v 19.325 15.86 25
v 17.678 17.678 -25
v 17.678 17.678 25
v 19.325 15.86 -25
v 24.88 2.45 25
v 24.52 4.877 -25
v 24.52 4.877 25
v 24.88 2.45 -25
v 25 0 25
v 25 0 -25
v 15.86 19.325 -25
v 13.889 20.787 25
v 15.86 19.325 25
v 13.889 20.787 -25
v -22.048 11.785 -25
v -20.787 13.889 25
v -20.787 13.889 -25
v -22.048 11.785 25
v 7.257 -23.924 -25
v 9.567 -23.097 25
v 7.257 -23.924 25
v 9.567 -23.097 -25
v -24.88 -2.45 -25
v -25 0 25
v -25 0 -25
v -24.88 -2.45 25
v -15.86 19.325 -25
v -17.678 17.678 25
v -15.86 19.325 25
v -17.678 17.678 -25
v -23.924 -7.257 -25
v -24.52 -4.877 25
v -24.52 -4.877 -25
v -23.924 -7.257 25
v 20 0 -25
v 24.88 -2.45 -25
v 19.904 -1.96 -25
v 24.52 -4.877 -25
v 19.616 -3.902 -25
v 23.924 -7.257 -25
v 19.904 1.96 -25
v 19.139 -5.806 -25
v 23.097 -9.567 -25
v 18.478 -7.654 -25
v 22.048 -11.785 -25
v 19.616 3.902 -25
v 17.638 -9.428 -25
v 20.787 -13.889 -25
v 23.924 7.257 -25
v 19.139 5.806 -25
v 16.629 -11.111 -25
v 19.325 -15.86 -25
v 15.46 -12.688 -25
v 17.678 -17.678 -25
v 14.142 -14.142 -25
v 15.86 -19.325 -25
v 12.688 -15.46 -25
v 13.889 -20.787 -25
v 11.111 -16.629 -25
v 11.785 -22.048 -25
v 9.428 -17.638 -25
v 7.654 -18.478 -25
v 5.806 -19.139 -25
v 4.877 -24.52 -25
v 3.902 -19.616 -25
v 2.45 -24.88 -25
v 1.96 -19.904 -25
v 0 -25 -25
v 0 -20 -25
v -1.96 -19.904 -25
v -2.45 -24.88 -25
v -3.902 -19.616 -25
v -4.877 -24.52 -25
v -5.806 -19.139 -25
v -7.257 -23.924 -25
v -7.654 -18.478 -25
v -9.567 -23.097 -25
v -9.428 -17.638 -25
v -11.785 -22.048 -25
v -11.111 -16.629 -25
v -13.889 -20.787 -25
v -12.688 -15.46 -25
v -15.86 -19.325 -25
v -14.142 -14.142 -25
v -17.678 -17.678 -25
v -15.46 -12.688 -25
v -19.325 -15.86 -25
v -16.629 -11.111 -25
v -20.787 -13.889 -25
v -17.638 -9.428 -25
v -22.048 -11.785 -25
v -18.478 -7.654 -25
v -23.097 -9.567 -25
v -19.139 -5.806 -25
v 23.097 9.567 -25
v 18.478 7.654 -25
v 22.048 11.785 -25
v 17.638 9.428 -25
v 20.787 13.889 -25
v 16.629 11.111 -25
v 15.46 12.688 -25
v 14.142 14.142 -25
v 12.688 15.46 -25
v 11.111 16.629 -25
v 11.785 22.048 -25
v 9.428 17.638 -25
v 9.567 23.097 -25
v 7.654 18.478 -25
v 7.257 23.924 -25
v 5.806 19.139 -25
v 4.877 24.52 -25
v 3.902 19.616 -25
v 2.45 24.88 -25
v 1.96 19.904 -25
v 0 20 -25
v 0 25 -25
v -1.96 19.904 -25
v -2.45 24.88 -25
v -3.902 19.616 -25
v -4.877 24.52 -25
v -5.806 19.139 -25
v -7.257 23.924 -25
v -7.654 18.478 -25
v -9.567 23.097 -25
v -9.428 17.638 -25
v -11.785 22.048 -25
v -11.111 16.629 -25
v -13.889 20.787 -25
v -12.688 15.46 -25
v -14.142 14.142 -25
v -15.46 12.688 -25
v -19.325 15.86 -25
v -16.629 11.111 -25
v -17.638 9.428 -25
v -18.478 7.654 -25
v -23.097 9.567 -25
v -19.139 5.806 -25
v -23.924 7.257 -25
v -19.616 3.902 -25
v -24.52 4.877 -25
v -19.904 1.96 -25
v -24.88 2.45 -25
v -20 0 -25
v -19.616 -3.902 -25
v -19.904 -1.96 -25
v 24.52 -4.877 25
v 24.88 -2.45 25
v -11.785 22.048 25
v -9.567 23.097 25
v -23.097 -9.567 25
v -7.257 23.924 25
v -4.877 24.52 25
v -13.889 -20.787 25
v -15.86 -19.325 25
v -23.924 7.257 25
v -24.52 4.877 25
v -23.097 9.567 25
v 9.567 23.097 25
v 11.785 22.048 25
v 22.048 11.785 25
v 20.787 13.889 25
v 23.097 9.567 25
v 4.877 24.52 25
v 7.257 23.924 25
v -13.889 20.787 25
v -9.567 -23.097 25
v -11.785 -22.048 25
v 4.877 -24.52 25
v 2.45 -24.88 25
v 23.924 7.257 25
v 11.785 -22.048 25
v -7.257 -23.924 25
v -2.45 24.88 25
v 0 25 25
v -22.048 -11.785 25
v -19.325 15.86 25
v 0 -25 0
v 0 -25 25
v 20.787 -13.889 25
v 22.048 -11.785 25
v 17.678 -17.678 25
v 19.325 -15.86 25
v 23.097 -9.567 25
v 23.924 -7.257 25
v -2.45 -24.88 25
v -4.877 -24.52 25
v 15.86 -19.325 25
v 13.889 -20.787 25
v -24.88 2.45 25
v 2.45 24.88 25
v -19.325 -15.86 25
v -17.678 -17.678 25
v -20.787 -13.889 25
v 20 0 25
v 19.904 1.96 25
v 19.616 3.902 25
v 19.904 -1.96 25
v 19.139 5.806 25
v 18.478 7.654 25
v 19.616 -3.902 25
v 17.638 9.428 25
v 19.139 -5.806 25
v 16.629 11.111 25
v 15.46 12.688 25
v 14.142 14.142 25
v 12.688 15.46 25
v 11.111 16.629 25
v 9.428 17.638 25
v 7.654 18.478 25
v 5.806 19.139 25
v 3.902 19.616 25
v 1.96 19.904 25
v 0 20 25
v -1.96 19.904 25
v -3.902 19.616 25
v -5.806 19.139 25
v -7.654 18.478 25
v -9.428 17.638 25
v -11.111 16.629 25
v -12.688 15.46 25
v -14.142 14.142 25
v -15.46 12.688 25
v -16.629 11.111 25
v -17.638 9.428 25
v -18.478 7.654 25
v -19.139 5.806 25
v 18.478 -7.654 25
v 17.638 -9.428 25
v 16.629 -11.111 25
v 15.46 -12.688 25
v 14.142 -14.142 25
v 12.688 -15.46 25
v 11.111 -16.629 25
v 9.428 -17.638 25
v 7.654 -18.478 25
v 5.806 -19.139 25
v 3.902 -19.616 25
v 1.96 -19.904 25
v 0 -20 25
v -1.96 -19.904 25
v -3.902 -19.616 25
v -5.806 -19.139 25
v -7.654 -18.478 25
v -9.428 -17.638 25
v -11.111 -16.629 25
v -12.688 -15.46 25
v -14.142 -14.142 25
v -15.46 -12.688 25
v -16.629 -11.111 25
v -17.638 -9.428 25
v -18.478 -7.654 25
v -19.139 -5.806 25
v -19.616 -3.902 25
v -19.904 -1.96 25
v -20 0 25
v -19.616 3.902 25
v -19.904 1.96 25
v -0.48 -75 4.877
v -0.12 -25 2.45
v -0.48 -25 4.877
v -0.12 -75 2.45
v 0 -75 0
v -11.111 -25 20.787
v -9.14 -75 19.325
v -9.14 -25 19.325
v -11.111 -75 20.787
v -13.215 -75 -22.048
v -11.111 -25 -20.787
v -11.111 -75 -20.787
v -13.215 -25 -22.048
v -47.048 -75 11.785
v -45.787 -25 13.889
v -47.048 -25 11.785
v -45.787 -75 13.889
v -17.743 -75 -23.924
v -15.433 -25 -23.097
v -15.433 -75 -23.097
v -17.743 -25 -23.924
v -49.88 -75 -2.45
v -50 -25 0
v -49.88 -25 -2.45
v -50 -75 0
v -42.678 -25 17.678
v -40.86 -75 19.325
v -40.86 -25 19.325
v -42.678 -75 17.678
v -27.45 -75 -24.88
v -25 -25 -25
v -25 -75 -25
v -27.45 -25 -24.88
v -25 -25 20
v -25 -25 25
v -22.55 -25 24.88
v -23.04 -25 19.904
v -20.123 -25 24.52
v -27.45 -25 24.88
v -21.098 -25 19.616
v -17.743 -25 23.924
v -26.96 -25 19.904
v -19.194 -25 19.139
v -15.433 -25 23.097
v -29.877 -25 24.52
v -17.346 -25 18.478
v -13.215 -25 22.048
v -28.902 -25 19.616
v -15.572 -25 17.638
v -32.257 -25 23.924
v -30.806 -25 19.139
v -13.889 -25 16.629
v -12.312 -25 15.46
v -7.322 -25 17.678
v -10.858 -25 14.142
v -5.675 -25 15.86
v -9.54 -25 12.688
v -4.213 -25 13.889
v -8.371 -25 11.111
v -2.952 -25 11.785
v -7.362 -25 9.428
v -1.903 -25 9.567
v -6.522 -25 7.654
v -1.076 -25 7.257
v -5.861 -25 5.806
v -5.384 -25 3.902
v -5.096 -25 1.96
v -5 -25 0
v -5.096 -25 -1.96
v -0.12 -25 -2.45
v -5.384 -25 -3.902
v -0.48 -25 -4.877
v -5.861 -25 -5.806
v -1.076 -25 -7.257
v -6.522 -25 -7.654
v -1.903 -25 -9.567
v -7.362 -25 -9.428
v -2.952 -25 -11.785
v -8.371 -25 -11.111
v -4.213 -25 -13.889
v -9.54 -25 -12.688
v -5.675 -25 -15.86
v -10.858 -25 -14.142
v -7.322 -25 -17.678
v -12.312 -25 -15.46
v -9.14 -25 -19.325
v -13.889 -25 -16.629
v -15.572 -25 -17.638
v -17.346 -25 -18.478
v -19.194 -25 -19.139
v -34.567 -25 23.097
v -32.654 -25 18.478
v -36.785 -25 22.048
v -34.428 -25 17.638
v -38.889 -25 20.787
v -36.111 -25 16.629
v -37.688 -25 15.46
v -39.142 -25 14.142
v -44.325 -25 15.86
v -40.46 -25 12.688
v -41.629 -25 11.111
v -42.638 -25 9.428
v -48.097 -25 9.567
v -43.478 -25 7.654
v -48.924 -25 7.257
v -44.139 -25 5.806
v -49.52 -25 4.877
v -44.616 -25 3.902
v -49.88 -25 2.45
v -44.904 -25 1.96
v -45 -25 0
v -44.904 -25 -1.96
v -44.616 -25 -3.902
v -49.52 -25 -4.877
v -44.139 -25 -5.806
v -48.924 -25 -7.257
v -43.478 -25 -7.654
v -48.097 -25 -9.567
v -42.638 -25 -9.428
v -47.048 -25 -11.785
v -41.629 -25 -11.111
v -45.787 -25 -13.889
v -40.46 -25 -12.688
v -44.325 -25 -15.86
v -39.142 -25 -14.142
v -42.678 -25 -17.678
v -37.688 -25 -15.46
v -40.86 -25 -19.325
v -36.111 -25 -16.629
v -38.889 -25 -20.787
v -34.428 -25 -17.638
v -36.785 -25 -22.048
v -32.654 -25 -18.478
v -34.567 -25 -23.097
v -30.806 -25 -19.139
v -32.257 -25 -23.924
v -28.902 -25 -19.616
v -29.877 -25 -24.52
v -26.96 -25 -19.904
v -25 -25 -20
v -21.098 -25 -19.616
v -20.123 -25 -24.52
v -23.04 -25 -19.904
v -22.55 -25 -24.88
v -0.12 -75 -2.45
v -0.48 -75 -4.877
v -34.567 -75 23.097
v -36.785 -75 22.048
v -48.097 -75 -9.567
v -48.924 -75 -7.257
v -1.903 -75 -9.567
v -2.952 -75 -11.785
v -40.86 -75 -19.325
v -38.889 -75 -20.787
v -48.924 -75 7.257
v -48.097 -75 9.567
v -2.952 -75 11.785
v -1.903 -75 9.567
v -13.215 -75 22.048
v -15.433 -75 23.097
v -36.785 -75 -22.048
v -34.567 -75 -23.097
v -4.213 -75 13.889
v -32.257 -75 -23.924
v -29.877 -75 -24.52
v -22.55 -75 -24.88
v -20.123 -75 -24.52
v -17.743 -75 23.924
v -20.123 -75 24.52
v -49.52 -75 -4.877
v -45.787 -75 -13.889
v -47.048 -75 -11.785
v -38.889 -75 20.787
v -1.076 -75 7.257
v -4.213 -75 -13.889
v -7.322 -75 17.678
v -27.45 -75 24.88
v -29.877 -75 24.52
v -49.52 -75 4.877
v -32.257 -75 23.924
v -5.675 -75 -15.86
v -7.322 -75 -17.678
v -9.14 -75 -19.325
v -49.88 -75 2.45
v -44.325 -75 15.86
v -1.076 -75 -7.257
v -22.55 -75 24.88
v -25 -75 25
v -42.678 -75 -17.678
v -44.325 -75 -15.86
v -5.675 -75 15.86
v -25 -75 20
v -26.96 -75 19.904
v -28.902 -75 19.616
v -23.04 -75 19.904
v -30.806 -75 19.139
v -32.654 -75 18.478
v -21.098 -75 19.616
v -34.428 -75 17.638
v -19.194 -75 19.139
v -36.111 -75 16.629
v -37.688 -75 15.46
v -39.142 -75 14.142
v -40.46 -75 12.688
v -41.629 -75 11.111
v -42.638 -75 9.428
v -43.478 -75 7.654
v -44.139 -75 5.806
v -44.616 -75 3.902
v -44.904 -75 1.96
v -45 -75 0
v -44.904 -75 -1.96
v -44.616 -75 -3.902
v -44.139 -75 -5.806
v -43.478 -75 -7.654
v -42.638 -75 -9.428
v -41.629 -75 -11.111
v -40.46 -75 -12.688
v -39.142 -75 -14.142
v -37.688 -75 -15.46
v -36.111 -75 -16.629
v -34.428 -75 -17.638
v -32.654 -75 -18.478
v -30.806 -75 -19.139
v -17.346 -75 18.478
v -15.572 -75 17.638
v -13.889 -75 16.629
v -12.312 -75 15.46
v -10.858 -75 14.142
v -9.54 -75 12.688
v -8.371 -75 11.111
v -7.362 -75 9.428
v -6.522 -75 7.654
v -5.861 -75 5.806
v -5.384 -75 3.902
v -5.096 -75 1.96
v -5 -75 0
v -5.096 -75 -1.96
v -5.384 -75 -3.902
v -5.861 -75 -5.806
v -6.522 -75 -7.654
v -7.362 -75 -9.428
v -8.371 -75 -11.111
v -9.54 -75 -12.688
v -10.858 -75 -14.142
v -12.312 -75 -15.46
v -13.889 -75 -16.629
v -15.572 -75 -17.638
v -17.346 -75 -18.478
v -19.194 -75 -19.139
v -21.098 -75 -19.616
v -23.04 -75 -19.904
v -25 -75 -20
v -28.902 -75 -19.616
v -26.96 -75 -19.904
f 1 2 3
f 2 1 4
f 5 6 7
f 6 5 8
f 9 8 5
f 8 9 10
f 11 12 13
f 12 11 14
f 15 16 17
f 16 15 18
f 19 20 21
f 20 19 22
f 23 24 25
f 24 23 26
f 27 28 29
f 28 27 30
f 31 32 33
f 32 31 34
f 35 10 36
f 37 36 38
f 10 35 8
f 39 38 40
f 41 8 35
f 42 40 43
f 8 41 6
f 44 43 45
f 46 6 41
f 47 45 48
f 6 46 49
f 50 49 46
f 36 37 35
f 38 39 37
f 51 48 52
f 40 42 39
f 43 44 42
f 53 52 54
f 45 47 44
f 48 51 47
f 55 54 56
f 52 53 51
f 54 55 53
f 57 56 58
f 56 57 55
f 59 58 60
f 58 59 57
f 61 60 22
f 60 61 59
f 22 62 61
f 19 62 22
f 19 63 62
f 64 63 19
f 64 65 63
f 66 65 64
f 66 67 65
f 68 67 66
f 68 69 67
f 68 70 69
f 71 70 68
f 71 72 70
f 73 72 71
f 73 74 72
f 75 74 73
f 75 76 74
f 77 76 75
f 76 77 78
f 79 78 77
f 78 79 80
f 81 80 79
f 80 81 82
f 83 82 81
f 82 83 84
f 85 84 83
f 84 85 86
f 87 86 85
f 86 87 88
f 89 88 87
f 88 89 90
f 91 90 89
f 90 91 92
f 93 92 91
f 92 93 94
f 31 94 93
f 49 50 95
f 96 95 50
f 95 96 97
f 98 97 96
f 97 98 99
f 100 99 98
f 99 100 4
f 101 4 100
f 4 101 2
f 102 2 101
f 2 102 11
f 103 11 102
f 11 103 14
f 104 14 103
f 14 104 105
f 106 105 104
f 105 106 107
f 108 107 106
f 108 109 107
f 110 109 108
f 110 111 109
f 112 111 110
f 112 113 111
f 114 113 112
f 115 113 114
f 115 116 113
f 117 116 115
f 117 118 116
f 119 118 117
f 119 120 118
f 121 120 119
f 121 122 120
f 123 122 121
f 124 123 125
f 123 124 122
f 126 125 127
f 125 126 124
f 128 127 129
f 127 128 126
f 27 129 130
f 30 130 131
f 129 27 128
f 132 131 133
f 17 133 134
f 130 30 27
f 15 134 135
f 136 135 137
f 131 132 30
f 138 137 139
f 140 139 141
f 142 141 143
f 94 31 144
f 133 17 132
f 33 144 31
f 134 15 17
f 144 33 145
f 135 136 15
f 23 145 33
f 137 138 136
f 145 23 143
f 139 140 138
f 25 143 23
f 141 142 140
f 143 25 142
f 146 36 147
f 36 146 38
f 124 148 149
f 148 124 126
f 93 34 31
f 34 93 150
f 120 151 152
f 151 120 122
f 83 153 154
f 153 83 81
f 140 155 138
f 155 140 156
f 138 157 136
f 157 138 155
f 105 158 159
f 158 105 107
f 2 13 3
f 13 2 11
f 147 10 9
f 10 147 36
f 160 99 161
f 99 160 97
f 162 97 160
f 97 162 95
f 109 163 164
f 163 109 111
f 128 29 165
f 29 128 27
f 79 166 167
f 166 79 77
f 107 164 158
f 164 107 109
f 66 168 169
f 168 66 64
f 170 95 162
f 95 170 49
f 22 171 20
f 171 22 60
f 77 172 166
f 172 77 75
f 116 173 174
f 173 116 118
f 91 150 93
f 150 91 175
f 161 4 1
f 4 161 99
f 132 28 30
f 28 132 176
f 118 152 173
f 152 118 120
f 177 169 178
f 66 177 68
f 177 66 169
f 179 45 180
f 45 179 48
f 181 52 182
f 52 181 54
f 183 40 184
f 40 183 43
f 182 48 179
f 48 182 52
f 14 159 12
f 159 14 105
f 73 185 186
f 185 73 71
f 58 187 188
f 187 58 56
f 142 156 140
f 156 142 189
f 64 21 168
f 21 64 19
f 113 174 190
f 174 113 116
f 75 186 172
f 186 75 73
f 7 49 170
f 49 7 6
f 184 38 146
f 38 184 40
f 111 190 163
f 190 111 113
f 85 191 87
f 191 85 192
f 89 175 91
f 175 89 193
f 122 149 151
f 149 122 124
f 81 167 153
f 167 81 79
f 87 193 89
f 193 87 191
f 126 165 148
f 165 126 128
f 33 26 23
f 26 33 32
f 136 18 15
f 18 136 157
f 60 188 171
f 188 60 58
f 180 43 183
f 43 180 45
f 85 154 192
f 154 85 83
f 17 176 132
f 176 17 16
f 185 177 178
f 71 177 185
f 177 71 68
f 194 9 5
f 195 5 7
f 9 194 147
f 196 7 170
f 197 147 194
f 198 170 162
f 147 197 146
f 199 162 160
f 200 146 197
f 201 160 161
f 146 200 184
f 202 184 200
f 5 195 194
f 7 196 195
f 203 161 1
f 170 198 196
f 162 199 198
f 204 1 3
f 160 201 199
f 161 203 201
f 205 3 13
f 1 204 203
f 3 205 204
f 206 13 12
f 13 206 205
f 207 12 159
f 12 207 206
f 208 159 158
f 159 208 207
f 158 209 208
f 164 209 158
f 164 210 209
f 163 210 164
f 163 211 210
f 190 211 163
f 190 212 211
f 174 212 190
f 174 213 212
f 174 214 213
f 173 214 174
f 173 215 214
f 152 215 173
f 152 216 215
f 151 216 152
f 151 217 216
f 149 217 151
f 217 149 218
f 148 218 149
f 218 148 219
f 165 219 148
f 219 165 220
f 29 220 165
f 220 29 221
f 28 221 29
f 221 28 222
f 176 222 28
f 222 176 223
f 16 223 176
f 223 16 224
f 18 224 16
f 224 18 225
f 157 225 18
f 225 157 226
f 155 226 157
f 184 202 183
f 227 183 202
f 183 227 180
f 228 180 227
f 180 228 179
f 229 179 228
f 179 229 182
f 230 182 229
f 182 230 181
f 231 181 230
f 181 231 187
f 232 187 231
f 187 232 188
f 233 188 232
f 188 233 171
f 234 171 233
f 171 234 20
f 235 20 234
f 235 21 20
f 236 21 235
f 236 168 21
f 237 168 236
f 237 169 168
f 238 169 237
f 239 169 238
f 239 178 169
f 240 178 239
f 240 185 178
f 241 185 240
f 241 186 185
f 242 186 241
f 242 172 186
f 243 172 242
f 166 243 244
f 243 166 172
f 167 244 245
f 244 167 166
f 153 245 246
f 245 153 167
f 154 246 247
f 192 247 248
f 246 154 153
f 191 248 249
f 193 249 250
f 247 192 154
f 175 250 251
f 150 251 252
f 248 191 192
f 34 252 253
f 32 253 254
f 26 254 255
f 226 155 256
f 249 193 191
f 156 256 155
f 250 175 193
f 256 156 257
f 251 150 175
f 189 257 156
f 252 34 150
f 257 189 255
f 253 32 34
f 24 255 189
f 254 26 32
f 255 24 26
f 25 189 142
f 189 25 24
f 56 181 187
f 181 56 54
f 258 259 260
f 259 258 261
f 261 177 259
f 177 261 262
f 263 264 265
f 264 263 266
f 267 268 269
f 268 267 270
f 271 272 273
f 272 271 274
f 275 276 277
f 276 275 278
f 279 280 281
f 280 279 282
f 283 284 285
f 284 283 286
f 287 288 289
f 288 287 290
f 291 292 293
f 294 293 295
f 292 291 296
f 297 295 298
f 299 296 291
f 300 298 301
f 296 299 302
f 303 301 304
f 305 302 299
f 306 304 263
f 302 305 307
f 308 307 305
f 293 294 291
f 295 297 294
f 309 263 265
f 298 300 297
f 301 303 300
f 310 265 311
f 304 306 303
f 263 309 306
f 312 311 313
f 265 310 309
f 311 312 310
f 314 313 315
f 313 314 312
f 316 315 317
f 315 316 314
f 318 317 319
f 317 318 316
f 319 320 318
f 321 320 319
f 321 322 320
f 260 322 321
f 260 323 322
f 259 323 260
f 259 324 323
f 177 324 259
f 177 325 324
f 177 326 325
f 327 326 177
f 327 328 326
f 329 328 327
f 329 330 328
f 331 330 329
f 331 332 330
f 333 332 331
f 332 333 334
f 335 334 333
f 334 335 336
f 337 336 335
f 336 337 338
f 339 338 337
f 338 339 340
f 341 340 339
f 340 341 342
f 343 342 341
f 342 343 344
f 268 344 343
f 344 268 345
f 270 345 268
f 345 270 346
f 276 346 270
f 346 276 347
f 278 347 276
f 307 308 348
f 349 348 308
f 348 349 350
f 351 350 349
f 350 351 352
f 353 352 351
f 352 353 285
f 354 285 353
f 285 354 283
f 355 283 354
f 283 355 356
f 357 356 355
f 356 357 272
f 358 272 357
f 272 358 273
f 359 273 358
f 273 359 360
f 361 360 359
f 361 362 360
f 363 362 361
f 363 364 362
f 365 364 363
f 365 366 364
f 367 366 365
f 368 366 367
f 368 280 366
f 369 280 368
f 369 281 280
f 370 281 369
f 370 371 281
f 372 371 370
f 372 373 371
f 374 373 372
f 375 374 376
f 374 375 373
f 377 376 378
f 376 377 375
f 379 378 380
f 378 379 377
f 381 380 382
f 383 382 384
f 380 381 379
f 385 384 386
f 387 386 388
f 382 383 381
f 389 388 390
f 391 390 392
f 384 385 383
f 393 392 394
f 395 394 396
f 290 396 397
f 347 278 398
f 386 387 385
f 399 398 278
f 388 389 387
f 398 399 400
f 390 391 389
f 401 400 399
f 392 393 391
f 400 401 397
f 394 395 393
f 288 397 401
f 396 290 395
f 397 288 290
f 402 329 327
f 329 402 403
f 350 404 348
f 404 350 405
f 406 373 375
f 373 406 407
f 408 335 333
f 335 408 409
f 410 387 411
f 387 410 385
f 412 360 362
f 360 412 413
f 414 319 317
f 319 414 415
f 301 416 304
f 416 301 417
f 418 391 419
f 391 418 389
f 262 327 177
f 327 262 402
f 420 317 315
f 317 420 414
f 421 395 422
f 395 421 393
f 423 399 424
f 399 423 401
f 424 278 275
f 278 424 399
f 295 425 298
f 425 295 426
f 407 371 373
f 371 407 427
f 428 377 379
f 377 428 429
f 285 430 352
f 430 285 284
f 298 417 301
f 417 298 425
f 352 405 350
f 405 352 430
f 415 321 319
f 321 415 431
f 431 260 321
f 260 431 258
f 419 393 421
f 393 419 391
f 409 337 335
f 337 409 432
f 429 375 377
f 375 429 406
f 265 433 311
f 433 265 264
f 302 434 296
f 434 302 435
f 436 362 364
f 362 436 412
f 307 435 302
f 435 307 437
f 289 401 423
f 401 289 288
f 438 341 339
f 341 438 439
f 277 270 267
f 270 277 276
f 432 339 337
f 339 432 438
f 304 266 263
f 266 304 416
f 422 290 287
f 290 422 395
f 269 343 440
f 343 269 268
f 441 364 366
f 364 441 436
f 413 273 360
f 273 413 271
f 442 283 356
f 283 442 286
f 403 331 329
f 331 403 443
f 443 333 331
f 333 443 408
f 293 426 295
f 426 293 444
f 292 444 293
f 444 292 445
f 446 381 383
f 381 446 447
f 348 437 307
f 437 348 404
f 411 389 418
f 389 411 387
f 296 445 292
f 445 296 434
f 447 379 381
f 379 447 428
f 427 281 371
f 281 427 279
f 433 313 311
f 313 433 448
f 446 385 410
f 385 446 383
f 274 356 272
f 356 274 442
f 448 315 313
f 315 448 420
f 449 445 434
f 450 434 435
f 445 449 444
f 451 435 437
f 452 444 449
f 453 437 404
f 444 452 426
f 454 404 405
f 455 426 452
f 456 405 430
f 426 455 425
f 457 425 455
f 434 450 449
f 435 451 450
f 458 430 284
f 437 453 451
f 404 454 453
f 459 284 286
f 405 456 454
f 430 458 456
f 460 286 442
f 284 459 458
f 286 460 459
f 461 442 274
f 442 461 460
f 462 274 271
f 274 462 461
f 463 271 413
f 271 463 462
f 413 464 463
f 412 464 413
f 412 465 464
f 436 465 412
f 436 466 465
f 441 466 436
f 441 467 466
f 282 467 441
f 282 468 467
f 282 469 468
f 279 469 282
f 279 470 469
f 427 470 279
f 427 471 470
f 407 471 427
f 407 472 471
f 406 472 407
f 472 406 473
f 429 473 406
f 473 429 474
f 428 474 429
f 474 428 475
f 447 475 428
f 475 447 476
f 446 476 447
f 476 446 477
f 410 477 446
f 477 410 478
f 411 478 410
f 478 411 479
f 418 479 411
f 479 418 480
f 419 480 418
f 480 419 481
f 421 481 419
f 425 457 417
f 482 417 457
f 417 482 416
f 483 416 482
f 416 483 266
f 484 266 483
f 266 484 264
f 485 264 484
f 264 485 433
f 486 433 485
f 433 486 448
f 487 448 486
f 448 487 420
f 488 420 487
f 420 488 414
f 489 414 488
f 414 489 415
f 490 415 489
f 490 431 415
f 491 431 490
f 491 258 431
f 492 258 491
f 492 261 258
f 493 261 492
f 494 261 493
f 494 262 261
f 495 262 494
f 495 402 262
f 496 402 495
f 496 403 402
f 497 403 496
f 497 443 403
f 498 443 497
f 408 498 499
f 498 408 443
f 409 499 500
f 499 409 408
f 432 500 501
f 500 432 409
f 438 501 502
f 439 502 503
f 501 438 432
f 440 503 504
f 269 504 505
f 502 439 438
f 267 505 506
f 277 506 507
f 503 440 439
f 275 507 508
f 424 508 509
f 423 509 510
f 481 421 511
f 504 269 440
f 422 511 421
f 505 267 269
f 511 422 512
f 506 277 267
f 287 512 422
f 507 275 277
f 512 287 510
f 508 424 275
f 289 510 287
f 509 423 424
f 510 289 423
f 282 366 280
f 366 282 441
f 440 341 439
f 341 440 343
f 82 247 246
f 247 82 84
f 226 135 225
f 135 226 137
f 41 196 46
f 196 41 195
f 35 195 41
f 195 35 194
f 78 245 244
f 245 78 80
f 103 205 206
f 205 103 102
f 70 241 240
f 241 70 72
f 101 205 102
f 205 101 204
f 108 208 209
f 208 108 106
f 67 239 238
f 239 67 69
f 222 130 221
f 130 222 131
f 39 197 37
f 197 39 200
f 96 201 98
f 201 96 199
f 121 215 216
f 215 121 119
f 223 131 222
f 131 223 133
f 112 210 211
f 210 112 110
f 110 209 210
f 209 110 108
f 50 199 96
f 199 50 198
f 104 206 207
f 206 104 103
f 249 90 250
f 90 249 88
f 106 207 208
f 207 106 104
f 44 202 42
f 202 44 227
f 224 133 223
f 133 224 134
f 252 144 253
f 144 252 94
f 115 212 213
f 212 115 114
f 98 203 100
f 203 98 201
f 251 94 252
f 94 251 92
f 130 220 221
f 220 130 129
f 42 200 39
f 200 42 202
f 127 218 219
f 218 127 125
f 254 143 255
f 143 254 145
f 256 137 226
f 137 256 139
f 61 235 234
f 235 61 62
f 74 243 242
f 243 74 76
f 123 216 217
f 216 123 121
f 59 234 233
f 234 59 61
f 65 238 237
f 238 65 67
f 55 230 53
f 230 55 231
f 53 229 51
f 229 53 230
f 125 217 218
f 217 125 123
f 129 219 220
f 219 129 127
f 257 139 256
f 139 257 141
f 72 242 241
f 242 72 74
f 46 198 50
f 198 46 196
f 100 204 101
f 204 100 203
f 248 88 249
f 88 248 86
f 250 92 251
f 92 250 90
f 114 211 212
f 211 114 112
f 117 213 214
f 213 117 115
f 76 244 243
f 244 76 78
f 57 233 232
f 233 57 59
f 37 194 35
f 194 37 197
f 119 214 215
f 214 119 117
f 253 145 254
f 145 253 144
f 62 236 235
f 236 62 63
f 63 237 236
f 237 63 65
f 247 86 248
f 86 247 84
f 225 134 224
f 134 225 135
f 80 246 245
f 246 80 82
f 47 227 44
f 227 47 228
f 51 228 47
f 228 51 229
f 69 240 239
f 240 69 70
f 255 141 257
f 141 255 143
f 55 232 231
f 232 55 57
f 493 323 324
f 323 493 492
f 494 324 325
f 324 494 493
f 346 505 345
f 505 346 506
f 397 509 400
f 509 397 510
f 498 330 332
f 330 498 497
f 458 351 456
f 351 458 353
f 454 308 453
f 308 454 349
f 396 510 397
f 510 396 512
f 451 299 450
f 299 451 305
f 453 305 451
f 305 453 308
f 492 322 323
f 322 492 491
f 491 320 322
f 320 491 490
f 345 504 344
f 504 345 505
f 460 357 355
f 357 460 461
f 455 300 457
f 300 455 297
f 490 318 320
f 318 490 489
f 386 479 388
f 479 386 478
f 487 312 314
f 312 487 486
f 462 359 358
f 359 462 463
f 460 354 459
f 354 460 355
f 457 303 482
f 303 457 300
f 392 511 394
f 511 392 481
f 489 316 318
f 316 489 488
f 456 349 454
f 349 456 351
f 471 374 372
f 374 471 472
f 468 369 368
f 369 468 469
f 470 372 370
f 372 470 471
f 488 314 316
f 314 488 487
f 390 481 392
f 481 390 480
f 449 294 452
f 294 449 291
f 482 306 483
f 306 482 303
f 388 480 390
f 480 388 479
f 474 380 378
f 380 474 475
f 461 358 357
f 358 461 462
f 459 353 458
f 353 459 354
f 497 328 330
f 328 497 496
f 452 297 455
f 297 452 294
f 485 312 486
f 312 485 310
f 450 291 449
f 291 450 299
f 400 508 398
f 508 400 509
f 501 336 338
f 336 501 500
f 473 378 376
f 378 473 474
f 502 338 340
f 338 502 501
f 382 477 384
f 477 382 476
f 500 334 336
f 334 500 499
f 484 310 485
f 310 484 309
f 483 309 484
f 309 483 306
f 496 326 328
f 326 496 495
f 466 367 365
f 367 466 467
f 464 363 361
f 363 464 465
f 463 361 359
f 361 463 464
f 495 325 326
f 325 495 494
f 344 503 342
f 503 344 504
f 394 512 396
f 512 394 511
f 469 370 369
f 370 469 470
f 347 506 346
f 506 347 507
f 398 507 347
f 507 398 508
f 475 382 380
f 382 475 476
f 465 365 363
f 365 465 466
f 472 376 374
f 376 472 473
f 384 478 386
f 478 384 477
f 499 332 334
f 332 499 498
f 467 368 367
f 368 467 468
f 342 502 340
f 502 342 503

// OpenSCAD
module ht_pipe() {
    difference() {
        union() {
            // Main vertical pipe
            translate([0, 0, -25])
                cylinder(h=50, r=25, $fn=64);
            // Horizontal pipe
            translate([-25, -25, 0])
                rotate([90, 0, 0])
                cylinder(h=50, r=25, $fn=64);
        }
        // Inner cut for vertical pipe
        translate([0, 0, -25])
            cylinder(h=50, r=20, $fn=64);
        // Inner cut for horizontal pipe
        translate([-25, -25, 0])
            rotate([90, 0, 0])
            cylinder(h=50, r=20, $fn=64);
    }
}

ht_pipe();
